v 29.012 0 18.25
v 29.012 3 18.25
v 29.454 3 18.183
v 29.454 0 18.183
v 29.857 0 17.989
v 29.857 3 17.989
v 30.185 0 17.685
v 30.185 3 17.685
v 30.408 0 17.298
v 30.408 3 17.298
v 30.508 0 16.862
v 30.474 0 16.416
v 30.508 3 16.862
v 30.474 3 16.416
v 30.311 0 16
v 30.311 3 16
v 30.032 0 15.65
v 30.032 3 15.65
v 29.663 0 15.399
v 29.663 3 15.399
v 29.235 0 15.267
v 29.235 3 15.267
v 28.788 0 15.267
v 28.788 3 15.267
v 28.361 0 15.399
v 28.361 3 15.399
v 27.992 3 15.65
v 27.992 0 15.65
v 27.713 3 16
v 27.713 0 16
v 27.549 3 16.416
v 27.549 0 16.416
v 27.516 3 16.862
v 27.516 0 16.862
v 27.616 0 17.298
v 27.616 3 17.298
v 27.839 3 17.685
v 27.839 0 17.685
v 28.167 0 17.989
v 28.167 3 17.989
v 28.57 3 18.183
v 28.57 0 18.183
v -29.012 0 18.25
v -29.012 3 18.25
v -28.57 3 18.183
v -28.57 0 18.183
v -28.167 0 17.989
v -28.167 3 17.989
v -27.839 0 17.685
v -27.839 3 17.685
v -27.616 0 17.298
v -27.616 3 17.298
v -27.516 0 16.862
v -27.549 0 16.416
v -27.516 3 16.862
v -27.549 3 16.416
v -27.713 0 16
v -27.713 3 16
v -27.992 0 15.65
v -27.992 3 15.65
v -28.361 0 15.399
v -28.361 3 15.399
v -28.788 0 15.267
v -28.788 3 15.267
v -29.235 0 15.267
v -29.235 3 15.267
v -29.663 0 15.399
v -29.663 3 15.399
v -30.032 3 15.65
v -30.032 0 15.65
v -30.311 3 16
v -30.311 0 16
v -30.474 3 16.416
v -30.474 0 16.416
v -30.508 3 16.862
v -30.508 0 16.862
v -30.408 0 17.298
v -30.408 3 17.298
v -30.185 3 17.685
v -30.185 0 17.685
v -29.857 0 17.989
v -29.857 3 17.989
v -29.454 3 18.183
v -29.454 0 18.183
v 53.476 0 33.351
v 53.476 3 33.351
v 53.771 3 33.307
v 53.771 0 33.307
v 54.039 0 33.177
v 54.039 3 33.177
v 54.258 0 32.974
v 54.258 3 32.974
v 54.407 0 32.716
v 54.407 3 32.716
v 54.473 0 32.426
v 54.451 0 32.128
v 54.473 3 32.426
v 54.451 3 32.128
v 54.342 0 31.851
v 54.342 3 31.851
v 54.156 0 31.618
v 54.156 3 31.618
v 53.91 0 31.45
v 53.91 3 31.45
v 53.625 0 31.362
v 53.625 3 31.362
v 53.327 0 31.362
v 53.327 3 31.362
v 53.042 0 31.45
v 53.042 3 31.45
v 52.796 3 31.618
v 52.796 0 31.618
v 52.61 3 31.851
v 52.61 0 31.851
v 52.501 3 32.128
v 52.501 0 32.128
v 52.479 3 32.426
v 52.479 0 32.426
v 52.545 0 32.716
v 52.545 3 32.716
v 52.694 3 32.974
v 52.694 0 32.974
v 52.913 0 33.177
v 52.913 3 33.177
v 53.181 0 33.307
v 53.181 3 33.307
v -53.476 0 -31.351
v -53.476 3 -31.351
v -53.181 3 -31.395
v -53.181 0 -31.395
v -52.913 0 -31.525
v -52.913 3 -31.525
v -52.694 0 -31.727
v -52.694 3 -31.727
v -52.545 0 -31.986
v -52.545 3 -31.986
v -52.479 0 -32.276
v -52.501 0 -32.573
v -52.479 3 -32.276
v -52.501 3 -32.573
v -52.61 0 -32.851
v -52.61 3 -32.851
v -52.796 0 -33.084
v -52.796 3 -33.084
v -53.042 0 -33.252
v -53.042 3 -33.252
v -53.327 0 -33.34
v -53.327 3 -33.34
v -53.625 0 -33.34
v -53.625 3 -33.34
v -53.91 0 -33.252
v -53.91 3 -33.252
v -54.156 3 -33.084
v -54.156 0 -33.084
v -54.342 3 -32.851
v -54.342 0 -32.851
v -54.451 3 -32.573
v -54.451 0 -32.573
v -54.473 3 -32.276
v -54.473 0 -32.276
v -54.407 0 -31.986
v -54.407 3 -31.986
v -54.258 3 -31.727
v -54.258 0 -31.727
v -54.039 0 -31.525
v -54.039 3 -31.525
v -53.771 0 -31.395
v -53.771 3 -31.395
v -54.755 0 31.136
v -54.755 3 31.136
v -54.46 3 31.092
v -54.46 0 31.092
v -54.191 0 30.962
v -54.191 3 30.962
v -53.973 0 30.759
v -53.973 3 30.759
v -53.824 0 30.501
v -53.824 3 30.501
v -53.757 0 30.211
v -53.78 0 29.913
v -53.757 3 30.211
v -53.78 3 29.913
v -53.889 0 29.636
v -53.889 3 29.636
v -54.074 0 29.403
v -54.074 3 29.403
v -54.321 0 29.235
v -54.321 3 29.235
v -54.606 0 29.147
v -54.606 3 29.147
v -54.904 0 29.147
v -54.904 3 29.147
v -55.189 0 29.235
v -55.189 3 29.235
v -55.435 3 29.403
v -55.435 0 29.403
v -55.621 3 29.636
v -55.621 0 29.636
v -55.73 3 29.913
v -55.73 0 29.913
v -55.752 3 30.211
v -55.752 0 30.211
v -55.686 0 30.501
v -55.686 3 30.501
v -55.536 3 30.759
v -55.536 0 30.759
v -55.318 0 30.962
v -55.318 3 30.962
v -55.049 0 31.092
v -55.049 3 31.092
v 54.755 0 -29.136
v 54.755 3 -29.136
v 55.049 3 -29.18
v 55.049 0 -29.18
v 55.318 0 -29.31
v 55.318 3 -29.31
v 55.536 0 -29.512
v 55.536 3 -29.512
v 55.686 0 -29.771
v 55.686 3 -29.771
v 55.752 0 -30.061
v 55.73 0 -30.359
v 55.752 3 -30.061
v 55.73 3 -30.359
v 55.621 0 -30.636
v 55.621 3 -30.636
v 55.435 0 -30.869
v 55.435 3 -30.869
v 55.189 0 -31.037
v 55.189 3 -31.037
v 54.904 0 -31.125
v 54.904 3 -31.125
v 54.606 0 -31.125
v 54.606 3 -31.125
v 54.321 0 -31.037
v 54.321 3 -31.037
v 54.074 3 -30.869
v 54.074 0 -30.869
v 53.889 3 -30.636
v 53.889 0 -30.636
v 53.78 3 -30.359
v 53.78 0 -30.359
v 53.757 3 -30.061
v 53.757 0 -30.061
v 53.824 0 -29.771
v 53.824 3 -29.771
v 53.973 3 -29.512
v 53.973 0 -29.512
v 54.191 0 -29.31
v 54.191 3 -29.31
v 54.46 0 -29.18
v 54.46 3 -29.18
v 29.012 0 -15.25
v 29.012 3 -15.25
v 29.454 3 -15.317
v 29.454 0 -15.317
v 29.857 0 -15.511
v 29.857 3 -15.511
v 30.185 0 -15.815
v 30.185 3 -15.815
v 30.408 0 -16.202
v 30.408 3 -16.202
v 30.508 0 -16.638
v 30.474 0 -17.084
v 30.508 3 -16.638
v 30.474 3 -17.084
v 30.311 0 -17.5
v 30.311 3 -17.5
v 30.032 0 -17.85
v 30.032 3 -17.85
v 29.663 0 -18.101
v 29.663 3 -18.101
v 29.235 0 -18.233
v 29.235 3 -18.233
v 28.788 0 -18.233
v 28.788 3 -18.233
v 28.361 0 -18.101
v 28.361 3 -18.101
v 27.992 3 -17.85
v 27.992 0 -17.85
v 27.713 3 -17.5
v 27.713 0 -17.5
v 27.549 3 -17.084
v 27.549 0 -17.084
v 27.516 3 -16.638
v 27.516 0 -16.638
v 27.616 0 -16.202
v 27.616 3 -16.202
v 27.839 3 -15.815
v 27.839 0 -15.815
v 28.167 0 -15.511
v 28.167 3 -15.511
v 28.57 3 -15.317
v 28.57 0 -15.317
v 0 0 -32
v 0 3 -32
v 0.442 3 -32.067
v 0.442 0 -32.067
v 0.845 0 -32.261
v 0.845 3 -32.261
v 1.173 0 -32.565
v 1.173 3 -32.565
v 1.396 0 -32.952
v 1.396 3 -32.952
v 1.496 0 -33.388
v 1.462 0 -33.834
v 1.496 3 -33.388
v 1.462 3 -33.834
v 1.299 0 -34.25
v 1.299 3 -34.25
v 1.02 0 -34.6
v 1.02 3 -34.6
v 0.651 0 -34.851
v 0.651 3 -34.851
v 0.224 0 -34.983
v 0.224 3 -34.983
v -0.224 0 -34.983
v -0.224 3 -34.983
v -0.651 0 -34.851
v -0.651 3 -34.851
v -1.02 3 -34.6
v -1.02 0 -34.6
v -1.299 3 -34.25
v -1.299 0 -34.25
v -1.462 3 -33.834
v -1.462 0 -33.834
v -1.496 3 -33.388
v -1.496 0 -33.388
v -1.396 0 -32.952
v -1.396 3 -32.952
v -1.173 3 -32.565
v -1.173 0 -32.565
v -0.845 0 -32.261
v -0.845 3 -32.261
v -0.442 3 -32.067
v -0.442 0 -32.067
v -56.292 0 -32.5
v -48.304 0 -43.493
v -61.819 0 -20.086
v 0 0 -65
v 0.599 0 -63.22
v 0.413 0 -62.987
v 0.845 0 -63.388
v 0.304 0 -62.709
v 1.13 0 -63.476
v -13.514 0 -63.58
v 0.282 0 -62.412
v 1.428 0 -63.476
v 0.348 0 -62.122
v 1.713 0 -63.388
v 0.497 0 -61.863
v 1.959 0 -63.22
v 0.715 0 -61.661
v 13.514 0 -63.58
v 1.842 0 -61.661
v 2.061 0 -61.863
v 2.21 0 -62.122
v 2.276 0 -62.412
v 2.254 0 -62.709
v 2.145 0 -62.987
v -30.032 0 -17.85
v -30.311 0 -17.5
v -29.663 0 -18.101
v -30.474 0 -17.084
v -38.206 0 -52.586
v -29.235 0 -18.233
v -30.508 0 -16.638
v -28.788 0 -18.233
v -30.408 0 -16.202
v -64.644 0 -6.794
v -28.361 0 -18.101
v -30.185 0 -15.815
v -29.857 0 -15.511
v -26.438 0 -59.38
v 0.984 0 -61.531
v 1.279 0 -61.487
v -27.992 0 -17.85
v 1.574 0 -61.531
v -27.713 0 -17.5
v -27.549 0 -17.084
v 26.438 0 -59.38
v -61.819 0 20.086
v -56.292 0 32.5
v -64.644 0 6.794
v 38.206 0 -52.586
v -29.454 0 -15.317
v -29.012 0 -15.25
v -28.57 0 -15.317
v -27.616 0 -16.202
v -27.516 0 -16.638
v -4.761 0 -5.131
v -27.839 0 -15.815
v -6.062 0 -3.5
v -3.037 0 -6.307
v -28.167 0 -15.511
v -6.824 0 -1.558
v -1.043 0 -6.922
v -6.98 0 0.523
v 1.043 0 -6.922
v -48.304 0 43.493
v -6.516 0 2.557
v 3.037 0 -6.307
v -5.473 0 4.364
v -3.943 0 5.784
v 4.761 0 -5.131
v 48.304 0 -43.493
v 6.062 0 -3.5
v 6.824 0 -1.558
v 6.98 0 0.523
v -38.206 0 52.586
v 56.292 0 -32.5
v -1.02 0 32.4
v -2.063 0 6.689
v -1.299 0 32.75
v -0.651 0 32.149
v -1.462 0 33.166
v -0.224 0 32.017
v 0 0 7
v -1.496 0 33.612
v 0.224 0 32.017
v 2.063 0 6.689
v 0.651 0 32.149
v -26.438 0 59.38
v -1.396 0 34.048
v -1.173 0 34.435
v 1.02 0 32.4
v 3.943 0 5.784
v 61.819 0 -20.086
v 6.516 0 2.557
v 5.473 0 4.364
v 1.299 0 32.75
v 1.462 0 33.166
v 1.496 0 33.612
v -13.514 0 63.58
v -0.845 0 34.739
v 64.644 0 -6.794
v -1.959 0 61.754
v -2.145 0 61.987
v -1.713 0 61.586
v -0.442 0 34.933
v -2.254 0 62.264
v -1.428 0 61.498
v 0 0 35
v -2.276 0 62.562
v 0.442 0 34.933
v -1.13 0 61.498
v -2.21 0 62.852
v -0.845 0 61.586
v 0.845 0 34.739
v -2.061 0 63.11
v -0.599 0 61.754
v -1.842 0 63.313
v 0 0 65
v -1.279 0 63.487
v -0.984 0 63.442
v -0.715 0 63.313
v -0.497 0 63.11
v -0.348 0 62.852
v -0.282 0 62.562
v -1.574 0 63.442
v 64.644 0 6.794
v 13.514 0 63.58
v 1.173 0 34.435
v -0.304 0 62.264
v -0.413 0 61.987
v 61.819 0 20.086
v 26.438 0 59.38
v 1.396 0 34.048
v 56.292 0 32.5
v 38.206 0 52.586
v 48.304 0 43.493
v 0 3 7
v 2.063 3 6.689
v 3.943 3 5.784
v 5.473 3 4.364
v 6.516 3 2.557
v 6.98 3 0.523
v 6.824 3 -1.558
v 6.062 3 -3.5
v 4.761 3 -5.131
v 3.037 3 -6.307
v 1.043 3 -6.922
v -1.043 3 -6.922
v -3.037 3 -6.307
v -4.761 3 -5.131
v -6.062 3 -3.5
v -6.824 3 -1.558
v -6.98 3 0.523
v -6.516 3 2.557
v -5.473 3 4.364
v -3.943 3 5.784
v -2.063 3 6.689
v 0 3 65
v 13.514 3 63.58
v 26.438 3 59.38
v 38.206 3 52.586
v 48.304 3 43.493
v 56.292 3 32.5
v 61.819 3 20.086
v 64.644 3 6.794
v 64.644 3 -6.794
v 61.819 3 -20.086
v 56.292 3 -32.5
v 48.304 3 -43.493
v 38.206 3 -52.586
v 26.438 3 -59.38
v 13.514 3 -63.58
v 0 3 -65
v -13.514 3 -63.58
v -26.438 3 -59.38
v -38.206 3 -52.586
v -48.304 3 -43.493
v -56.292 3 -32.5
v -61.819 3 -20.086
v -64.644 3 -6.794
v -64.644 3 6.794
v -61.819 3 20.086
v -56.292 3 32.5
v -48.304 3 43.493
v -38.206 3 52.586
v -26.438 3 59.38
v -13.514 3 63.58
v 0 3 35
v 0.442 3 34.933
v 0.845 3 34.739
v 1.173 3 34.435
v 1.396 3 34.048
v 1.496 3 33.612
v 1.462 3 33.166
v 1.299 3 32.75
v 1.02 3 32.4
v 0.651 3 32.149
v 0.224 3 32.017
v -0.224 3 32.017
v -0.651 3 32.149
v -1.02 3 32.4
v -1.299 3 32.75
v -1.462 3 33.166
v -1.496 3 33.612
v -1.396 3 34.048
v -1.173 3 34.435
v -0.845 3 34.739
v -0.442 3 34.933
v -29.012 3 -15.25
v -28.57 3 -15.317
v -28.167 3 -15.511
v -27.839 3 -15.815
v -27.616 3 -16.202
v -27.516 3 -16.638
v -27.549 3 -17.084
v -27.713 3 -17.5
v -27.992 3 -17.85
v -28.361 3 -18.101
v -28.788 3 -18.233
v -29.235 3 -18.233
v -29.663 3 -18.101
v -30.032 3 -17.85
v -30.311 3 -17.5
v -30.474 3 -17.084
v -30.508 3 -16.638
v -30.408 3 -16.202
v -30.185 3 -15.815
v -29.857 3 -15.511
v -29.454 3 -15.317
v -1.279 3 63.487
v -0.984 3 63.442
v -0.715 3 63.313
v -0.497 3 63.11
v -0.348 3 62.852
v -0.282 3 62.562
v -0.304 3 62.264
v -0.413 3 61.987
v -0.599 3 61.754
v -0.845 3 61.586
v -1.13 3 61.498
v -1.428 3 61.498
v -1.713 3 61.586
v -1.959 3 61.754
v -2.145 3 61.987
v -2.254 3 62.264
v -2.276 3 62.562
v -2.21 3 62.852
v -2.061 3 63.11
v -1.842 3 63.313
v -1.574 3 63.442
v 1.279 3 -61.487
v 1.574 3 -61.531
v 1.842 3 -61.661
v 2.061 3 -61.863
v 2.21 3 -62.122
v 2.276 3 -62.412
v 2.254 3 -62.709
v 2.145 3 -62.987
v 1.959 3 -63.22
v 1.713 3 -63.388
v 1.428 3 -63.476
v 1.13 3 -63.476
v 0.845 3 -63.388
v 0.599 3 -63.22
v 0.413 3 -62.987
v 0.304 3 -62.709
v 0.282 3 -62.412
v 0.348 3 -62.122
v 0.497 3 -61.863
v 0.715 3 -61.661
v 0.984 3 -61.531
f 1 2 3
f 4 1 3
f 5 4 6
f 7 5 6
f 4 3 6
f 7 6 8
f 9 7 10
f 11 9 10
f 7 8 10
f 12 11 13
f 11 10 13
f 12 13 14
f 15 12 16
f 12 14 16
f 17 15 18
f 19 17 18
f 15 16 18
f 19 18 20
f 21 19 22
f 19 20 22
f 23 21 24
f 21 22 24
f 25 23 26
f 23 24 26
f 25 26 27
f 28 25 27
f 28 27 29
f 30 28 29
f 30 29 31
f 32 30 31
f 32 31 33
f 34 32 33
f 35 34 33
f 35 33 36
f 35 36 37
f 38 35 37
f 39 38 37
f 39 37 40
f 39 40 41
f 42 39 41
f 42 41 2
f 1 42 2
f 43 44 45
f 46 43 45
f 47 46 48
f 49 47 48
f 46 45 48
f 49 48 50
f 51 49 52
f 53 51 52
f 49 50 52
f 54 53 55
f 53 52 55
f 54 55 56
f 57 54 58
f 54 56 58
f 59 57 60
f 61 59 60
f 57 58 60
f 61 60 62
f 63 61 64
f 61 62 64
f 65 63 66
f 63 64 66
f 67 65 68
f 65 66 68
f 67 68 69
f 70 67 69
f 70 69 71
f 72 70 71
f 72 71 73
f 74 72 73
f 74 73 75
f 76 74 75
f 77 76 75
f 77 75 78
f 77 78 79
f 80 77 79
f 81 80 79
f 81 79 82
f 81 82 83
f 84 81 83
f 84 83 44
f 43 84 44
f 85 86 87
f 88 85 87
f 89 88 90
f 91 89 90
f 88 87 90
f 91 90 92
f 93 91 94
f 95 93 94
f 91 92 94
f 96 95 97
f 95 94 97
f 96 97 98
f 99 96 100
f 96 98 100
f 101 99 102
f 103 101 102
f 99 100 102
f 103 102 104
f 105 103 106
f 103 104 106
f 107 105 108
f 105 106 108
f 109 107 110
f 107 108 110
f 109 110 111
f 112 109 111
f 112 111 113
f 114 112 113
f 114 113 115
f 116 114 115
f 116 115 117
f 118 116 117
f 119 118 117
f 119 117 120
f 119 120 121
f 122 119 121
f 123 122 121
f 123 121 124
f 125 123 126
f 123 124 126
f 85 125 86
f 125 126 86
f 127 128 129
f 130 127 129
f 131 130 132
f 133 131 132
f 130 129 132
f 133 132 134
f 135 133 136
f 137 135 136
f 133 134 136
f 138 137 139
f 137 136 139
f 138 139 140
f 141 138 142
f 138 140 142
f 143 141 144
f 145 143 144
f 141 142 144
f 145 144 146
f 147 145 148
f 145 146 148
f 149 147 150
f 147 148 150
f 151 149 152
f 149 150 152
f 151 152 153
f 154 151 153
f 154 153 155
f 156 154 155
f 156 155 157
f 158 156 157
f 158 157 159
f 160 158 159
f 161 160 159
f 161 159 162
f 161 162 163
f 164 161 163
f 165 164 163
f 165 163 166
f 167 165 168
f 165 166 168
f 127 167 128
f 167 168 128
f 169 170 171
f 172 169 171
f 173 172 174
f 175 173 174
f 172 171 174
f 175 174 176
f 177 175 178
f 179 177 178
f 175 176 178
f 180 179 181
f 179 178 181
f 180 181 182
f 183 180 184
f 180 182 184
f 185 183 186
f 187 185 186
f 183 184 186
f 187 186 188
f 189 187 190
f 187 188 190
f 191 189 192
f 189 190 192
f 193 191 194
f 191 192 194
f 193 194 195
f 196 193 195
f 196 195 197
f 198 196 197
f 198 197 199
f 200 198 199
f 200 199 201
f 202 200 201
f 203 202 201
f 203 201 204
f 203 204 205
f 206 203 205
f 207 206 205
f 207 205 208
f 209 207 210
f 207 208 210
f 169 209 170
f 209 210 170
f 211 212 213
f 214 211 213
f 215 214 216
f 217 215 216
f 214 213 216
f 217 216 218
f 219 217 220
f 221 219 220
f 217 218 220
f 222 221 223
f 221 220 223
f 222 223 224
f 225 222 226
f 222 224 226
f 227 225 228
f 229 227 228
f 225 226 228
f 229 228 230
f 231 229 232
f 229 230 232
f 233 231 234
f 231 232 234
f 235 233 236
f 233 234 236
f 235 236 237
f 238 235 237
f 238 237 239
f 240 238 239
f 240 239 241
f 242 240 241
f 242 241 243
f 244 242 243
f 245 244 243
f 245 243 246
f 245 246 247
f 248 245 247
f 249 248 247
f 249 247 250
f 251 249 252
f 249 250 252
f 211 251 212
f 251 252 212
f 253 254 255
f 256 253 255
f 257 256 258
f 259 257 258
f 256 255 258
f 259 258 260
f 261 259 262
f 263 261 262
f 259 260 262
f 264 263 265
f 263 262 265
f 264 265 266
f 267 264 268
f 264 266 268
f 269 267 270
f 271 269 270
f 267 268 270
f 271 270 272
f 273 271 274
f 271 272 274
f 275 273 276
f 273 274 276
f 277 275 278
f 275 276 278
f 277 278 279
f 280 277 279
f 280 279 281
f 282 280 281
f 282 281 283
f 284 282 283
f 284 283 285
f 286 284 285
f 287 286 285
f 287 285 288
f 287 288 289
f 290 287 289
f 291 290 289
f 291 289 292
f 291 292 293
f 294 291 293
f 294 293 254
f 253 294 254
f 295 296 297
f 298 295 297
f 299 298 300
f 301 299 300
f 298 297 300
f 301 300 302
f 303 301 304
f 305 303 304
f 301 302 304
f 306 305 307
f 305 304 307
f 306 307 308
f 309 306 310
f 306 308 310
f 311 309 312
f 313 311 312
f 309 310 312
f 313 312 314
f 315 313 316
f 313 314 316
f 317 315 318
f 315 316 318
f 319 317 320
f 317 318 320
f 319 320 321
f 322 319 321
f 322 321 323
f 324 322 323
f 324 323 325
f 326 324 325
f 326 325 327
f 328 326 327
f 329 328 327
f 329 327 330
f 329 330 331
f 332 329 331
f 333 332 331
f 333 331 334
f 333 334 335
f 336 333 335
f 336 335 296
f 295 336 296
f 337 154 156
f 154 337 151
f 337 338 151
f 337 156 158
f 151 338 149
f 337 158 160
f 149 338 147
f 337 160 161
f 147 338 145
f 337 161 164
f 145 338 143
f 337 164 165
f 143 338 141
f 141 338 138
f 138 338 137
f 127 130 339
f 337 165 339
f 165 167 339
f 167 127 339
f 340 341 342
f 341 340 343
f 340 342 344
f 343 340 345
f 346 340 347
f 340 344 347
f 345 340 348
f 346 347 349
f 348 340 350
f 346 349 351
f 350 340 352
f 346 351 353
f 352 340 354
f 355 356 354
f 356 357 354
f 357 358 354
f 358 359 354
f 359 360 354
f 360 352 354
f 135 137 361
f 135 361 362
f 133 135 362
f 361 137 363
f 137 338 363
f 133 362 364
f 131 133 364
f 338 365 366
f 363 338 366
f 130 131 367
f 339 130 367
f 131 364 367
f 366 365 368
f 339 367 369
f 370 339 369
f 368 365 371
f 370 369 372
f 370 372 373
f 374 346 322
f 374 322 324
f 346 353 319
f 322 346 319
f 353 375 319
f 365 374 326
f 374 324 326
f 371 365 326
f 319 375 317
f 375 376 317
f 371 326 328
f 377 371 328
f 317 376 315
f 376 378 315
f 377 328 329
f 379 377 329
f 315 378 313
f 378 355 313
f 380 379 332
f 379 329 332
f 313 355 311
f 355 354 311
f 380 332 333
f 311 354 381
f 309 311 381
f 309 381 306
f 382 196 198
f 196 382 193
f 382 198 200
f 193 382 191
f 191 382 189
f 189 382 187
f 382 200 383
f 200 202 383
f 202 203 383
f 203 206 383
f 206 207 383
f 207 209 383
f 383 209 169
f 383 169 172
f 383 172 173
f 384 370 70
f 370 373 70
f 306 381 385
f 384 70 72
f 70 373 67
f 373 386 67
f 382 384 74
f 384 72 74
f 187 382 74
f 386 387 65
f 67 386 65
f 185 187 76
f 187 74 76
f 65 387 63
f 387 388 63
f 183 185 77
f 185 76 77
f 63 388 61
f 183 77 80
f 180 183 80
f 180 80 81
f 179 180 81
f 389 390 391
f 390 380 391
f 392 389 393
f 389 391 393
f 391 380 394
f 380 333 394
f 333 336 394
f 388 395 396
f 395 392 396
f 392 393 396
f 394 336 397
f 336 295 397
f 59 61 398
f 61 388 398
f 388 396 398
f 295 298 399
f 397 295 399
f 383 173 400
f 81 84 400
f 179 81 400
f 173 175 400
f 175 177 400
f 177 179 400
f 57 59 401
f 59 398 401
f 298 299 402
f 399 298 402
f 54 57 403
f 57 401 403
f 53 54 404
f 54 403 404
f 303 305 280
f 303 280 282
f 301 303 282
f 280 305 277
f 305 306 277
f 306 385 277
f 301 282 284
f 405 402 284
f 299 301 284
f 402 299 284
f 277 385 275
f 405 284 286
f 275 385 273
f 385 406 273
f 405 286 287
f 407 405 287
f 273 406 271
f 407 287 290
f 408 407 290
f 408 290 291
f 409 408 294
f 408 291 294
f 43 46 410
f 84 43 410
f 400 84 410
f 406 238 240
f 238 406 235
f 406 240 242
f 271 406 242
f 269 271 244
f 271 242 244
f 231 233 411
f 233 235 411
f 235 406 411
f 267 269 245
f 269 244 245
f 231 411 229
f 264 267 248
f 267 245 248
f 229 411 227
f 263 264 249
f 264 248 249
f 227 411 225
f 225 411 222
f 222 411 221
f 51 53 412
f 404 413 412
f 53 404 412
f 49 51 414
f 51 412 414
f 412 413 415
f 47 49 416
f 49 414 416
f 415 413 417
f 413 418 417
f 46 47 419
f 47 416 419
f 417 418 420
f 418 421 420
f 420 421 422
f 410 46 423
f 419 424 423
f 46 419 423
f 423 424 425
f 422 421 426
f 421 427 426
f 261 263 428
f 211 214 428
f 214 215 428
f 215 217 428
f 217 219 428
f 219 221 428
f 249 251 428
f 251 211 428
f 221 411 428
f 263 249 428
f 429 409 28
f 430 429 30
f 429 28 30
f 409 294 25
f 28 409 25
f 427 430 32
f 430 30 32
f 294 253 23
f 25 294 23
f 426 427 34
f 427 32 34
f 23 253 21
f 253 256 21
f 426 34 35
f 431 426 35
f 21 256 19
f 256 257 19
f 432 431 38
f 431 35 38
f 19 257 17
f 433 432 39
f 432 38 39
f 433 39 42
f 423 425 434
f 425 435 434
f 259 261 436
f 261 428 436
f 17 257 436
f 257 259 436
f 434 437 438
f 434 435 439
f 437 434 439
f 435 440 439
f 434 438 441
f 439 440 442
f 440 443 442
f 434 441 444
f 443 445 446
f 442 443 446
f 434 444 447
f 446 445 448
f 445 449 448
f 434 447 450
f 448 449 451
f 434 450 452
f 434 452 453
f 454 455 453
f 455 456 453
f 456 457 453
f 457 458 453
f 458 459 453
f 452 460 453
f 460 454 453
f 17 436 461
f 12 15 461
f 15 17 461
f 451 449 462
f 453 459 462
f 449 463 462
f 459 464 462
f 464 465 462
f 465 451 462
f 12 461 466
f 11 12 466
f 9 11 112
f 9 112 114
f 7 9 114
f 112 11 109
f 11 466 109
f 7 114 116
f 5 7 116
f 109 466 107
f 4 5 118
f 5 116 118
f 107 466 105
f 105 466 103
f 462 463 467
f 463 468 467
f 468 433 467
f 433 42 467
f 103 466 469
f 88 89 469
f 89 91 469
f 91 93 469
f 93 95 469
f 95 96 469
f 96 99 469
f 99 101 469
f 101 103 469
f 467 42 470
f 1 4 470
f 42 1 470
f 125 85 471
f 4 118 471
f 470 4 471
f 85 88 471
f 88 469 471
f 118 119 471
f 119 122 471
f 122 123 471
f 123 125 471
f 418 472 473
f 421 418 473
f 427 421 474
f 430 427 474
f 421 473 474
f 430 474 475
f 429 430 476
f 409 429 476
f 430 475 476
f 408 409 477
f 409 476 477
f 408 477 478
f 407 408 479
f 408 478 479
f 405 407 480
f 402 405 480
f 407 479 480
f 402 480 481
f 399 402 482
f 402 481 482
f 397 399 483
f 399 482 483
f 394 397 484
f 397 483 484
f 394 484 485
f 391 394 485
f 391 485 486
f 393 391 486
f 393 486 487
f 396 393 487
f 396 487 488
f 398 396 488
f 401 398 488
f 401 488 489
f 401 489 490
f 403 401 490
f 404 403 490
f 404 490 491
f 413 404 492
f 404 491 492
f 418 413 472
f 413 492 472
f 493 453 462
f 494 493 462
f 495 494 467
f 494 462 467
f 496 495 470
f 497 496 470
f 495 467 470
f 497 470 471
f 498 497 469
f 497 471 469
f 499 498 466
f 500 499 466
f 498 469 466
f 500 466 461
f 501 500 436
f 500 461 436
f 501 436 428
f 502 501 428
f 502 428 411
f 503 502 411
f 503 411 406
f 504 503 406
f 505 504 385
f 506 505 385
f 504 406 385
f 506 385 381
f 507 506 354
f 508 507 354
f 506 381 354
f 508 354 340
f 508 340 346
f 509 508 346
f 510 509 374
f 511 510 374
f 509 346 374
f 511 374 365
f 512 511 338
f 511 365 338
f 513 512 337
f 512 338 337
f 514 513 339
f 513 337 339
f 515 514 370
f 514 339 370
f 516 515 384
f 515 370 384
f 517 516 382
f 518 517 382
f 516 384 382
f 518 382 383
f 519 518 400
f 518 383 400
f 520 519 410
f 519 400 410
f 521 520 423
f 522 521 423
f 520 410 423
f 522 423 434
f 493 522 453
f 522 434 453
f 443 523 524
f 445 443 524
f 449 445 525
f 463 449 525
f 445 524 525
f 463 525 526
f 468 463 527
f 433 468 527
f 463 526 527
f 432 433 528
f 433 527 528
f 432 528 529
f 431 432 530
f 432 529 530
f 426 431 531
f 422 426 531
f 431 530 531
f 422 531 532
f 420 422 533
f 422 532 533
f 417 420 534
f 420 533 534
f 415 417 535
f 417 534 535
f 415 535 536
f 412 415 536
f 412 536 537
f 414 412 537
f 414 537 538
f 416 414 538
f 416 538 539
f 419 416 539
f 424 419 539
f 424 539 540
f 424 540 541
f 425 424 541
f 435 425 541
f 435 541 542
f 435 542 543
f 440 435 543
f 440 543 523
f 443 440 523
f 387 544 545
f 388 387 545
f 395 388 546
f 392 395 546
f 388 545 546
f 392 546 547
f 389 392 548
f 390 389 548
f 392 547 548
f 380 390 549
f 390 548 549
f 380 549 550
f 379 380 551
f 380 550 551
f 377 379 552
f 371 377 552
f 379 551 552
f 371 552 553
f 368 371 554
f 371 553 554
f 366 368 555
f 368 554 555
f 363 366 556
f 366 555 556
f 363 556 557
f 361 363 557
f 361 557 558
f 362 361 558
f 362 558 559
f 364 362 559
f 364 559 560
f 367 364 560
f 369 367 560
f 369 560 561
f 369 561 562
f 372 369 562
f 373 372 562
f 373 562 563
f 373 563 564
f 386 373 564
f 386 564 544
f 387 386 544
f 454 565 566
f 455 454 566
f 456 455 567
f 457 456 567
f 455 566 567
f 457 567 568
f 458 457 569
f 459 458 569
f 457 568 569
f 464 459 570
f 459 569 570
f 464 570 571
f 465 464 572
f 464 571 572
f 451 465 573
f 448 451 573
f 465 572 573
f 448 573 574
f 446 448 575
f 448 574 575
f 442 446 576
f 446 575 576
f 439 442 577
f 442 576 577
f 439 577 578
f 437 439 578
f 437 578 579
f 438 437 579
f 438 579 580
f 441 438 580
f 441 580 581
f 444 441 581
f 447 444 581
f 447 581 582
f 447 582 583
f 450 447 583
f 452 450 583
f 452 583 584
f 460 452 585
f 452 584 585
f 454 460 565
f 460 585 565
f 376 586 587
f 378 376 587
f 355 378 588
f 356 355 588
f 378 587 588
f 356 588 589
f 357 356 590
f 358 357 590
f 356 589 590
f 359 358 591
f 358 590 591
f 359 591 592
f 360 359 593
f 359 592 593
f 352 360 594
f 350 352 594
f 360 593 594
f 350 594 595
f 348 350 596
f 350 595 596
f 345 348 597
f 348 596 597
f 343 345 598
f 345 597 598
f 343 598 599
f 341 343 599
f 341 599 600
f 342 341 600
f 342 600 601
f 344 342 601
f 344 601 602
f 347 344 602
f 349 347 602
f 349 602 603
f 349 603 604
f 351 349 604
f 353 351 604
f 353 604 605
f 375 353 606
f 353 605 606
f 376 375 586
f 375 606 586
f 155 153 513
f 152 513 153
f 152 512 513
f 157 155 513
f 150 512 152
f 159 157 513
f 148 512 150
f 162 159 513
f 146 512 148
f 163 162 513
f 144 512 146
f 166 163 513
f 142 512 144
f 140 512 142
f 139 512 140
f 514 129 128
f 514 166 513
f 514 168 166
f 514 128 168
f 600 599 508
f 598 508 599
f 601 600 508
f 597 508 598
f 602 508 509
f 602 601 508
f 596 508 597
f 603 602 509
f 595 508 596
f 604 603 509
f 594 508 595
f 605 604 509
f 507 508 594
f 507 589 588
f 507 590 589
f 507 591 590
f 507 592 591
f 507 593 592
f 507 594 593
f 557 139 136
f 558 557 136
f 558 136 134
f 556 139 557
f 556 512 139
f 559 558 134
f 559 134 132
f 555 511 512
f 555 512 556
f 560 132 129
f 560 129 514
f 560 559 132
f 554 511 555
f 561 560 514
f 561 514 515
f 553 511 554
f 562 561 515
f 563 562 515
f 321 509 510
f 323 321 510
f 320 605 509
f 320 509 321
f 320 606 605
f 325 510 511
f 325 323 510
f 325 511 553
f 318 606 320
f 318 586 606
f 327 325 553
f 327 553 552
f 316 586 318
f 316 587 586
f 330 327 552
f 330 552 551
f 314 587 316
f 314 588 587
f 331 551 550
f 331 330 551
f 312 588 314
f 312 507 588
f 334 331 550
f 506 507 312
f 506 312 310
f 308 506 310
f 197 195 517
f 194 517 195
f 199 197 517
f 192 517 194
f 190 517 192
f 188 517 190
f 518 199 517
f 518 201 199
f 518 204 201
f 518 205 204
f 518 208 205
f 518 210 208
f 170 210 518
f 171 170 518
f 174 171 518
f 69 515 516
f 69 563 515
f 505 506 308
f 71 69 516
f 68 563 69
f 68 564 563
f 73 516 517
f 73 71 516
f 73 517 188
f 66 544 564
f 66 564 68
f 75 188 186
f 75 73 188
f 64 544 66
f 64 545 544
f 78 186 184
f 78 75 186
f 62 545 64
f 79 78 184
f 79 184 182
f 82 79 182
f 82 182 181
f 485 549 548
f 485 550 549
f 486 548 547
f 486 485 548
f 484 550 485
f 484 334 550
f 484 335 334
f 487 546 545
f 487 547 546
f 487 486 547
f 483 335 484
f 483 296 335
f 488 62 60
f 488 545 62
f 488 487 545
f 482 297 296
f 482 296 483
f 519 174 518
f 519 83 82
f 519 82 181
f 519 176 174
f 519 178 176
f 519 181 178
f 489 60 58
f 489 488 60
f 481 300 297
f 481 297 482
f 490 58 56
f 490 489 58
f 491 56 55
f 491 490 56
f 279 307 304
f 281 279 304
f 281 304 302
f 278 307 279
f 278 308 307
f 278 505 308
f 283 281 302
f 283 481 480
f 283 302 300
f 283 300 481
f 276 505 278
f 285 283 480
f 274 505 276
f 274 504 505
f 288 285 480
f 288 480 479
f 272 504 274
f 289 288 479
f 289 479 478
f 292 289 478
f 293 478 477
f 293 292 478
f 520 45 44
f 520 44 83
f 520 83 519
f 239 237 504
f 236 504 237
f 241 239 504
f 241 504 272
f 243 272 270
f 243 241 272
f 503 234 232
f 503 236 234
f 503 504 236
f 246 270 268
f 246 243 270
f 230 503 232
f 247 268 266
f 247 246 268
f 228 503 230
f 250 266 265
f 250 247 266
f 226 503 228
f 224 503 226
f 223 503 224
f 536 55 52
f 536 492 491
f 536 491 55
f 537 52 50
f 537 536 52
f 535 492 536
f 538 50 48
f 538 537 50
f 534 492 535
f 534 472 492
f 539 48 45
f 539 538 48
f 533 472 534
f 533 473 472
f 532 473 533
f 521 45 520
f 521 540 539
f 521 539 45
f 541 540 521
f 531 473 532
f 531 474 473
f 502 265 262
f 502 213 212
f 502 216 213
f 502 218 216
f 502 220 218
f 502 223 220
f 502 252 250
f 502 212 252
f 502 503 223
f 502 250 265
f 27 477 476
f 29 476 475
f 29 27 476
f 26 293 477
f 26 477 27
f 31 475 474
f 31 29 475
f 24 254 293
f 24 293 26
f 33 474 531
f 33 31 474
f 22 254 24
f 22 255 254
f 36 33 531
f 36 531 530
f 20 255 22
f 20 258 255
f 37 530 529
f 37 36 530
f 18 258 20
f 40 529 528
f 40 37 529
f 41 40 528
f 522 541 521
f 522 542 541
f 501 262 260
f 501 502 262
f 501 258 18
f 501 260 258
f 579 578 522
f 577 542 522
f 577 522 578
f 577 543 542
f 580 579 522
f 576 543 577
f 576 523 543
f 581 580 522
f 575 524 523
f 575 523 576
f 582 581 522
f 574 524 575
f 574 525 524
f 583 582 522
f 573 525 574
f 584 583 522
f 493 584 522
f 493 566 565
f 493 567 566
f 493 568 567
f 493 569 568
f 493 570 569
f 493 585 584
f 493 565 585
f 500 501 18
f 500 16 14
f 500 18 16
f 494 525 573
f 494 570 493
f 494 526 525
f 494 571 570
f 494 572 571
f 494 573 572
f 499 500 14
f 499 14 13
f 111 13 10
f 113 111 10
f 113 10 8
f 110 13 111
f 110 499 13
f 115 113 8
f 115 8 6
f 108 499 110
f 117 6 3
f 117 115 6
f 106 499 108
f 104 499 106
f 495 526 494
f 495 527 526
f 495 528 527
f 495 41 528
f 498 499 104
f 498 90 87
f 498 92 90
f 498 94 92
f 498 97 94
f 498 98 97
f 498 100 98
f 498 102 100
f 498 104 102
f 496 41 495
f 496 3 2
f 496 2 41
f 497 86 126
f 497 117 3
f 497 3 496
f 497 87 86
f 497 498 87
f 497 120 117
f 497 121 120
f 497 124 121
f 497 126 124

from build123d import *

# Parameters (mm, degrees)
ESQUISSE1_R             = 65
BOSS_EXTRU_1_DEPTH      = 3
ESQUISSE2_R             = 1
ENL_V_MAT_EXTRU_1_DEPTH = 3
ESQUISSE3_R             = 7
ENL_V_MAT_EXTRU_2_DEPTH = 3
ESQUISSE4_R             = 1.5
ENL_V_MAT_EXTRU_4_DEPTH = 4


with BuildPart() as part:
    # Esquisse1 → Boss.-Extru.1 (new body)
    with BuildSketch(Plane(origin=(0, 0, 0), x_dir=(1, 0, 0), z_dir=(0, 1, 0))):
        with Locations(Location((0, 0, 0), (0, 0, 270))):
            Circle(ESQUISSE1_R)
    extrude(amount=BOSS_EXTRU_1_DEPTH)

    # Esquisse2 → Enlèv. mat.-Extru.1 (cut)
    with BuildSketch(Plane(origin=(0, 3, 0), x_dir=(1, 0, 0), z_dir=(0, 1, 0))):
        with Locations(Location((-53.47585562, 32.350932996, 0), (0, 0, 270))):
            Circle(ESQUISSE2_R)
        with Locations(Location((-54.754657621, -30.135982958, 0), (0, 0, 270))):
            Circle(ESQUISSE2_R)
        with Locations(Location((-1.278802001, -62.486915954, 0), (0, 0, 270))):
            Circle(ESQUISSE2_R)
        with Locations(Location((53.47585562, -32.350932996, 0), (0, 0, 270))):
            Circle(ESQUISSE2_R)
        with Locations(Location((54.754657621, 30.135982958, 0), (0, 0, 270))):
            Circle(ESQUISSE2_R)
        with Locations(Location((1.278802001, 62.486915954, 0), (0, 0, 270))):
            Circle(ESQUISSE2_R)
    extrude(amount=-ENL_V_MAT_EXTRU_1_DEPTH, mode=Mode.SUBTRACT)

    # Esquisse3 → Enlèv. mat.-Extru.2 (cut)
    with BuildSketch(Plane(origin=(0, 3, 0), x_dir=(1, 0, 0), z_dir=(0, 1, 0))):
        with Locations(Location((0, 0, 0), (0, 0, 270))):
            Circle(ESQUISSE3_R)
    extrude(amount=-ENL_V_MAT_EXTRU_2_DEPTH, mode=Mode.SUBTRACT)

    # Esquisse4 → Enlèv. mat.-Extru.4 (cut)
    with BuildSketch(Plane(origin=(0, 3, 0), x_dir=(1, 0, 0), z_dir=(0, 1, 0))):
        with Locations(Location((0, 33.5, 0), (0, 0, 270))):
            Circle(ESQUISSE4_R)
        with Locations(Location((29.011851027, 16.75, 0), (0, 0, 270))):
            Circle(ESQUISSE4_R)
        with Locations(Location((29.011851027, -16.75, 0), (0, 0, 270))):
            Circle(ESQUISSE4_R)
        with Locations(Location((0, -33.5, 0), (0, 0, 270))):
            Circle(ESQUISSE4_R)
        with Locations(Location((-29.011851027, -16.75, 0), (0, 0, 270))):
            Circle(ESQUISSE4_R)
        with Locations(Location((-29.011851027, 16.75, 0), (0, 0, 270))):
            Circle(ESQUISSE4_R)
    extrude(amount=-ENL_V_MAT_EXTRU_4_DEPTH, mode=Mode.SUBTRACT)


solid = part.part
